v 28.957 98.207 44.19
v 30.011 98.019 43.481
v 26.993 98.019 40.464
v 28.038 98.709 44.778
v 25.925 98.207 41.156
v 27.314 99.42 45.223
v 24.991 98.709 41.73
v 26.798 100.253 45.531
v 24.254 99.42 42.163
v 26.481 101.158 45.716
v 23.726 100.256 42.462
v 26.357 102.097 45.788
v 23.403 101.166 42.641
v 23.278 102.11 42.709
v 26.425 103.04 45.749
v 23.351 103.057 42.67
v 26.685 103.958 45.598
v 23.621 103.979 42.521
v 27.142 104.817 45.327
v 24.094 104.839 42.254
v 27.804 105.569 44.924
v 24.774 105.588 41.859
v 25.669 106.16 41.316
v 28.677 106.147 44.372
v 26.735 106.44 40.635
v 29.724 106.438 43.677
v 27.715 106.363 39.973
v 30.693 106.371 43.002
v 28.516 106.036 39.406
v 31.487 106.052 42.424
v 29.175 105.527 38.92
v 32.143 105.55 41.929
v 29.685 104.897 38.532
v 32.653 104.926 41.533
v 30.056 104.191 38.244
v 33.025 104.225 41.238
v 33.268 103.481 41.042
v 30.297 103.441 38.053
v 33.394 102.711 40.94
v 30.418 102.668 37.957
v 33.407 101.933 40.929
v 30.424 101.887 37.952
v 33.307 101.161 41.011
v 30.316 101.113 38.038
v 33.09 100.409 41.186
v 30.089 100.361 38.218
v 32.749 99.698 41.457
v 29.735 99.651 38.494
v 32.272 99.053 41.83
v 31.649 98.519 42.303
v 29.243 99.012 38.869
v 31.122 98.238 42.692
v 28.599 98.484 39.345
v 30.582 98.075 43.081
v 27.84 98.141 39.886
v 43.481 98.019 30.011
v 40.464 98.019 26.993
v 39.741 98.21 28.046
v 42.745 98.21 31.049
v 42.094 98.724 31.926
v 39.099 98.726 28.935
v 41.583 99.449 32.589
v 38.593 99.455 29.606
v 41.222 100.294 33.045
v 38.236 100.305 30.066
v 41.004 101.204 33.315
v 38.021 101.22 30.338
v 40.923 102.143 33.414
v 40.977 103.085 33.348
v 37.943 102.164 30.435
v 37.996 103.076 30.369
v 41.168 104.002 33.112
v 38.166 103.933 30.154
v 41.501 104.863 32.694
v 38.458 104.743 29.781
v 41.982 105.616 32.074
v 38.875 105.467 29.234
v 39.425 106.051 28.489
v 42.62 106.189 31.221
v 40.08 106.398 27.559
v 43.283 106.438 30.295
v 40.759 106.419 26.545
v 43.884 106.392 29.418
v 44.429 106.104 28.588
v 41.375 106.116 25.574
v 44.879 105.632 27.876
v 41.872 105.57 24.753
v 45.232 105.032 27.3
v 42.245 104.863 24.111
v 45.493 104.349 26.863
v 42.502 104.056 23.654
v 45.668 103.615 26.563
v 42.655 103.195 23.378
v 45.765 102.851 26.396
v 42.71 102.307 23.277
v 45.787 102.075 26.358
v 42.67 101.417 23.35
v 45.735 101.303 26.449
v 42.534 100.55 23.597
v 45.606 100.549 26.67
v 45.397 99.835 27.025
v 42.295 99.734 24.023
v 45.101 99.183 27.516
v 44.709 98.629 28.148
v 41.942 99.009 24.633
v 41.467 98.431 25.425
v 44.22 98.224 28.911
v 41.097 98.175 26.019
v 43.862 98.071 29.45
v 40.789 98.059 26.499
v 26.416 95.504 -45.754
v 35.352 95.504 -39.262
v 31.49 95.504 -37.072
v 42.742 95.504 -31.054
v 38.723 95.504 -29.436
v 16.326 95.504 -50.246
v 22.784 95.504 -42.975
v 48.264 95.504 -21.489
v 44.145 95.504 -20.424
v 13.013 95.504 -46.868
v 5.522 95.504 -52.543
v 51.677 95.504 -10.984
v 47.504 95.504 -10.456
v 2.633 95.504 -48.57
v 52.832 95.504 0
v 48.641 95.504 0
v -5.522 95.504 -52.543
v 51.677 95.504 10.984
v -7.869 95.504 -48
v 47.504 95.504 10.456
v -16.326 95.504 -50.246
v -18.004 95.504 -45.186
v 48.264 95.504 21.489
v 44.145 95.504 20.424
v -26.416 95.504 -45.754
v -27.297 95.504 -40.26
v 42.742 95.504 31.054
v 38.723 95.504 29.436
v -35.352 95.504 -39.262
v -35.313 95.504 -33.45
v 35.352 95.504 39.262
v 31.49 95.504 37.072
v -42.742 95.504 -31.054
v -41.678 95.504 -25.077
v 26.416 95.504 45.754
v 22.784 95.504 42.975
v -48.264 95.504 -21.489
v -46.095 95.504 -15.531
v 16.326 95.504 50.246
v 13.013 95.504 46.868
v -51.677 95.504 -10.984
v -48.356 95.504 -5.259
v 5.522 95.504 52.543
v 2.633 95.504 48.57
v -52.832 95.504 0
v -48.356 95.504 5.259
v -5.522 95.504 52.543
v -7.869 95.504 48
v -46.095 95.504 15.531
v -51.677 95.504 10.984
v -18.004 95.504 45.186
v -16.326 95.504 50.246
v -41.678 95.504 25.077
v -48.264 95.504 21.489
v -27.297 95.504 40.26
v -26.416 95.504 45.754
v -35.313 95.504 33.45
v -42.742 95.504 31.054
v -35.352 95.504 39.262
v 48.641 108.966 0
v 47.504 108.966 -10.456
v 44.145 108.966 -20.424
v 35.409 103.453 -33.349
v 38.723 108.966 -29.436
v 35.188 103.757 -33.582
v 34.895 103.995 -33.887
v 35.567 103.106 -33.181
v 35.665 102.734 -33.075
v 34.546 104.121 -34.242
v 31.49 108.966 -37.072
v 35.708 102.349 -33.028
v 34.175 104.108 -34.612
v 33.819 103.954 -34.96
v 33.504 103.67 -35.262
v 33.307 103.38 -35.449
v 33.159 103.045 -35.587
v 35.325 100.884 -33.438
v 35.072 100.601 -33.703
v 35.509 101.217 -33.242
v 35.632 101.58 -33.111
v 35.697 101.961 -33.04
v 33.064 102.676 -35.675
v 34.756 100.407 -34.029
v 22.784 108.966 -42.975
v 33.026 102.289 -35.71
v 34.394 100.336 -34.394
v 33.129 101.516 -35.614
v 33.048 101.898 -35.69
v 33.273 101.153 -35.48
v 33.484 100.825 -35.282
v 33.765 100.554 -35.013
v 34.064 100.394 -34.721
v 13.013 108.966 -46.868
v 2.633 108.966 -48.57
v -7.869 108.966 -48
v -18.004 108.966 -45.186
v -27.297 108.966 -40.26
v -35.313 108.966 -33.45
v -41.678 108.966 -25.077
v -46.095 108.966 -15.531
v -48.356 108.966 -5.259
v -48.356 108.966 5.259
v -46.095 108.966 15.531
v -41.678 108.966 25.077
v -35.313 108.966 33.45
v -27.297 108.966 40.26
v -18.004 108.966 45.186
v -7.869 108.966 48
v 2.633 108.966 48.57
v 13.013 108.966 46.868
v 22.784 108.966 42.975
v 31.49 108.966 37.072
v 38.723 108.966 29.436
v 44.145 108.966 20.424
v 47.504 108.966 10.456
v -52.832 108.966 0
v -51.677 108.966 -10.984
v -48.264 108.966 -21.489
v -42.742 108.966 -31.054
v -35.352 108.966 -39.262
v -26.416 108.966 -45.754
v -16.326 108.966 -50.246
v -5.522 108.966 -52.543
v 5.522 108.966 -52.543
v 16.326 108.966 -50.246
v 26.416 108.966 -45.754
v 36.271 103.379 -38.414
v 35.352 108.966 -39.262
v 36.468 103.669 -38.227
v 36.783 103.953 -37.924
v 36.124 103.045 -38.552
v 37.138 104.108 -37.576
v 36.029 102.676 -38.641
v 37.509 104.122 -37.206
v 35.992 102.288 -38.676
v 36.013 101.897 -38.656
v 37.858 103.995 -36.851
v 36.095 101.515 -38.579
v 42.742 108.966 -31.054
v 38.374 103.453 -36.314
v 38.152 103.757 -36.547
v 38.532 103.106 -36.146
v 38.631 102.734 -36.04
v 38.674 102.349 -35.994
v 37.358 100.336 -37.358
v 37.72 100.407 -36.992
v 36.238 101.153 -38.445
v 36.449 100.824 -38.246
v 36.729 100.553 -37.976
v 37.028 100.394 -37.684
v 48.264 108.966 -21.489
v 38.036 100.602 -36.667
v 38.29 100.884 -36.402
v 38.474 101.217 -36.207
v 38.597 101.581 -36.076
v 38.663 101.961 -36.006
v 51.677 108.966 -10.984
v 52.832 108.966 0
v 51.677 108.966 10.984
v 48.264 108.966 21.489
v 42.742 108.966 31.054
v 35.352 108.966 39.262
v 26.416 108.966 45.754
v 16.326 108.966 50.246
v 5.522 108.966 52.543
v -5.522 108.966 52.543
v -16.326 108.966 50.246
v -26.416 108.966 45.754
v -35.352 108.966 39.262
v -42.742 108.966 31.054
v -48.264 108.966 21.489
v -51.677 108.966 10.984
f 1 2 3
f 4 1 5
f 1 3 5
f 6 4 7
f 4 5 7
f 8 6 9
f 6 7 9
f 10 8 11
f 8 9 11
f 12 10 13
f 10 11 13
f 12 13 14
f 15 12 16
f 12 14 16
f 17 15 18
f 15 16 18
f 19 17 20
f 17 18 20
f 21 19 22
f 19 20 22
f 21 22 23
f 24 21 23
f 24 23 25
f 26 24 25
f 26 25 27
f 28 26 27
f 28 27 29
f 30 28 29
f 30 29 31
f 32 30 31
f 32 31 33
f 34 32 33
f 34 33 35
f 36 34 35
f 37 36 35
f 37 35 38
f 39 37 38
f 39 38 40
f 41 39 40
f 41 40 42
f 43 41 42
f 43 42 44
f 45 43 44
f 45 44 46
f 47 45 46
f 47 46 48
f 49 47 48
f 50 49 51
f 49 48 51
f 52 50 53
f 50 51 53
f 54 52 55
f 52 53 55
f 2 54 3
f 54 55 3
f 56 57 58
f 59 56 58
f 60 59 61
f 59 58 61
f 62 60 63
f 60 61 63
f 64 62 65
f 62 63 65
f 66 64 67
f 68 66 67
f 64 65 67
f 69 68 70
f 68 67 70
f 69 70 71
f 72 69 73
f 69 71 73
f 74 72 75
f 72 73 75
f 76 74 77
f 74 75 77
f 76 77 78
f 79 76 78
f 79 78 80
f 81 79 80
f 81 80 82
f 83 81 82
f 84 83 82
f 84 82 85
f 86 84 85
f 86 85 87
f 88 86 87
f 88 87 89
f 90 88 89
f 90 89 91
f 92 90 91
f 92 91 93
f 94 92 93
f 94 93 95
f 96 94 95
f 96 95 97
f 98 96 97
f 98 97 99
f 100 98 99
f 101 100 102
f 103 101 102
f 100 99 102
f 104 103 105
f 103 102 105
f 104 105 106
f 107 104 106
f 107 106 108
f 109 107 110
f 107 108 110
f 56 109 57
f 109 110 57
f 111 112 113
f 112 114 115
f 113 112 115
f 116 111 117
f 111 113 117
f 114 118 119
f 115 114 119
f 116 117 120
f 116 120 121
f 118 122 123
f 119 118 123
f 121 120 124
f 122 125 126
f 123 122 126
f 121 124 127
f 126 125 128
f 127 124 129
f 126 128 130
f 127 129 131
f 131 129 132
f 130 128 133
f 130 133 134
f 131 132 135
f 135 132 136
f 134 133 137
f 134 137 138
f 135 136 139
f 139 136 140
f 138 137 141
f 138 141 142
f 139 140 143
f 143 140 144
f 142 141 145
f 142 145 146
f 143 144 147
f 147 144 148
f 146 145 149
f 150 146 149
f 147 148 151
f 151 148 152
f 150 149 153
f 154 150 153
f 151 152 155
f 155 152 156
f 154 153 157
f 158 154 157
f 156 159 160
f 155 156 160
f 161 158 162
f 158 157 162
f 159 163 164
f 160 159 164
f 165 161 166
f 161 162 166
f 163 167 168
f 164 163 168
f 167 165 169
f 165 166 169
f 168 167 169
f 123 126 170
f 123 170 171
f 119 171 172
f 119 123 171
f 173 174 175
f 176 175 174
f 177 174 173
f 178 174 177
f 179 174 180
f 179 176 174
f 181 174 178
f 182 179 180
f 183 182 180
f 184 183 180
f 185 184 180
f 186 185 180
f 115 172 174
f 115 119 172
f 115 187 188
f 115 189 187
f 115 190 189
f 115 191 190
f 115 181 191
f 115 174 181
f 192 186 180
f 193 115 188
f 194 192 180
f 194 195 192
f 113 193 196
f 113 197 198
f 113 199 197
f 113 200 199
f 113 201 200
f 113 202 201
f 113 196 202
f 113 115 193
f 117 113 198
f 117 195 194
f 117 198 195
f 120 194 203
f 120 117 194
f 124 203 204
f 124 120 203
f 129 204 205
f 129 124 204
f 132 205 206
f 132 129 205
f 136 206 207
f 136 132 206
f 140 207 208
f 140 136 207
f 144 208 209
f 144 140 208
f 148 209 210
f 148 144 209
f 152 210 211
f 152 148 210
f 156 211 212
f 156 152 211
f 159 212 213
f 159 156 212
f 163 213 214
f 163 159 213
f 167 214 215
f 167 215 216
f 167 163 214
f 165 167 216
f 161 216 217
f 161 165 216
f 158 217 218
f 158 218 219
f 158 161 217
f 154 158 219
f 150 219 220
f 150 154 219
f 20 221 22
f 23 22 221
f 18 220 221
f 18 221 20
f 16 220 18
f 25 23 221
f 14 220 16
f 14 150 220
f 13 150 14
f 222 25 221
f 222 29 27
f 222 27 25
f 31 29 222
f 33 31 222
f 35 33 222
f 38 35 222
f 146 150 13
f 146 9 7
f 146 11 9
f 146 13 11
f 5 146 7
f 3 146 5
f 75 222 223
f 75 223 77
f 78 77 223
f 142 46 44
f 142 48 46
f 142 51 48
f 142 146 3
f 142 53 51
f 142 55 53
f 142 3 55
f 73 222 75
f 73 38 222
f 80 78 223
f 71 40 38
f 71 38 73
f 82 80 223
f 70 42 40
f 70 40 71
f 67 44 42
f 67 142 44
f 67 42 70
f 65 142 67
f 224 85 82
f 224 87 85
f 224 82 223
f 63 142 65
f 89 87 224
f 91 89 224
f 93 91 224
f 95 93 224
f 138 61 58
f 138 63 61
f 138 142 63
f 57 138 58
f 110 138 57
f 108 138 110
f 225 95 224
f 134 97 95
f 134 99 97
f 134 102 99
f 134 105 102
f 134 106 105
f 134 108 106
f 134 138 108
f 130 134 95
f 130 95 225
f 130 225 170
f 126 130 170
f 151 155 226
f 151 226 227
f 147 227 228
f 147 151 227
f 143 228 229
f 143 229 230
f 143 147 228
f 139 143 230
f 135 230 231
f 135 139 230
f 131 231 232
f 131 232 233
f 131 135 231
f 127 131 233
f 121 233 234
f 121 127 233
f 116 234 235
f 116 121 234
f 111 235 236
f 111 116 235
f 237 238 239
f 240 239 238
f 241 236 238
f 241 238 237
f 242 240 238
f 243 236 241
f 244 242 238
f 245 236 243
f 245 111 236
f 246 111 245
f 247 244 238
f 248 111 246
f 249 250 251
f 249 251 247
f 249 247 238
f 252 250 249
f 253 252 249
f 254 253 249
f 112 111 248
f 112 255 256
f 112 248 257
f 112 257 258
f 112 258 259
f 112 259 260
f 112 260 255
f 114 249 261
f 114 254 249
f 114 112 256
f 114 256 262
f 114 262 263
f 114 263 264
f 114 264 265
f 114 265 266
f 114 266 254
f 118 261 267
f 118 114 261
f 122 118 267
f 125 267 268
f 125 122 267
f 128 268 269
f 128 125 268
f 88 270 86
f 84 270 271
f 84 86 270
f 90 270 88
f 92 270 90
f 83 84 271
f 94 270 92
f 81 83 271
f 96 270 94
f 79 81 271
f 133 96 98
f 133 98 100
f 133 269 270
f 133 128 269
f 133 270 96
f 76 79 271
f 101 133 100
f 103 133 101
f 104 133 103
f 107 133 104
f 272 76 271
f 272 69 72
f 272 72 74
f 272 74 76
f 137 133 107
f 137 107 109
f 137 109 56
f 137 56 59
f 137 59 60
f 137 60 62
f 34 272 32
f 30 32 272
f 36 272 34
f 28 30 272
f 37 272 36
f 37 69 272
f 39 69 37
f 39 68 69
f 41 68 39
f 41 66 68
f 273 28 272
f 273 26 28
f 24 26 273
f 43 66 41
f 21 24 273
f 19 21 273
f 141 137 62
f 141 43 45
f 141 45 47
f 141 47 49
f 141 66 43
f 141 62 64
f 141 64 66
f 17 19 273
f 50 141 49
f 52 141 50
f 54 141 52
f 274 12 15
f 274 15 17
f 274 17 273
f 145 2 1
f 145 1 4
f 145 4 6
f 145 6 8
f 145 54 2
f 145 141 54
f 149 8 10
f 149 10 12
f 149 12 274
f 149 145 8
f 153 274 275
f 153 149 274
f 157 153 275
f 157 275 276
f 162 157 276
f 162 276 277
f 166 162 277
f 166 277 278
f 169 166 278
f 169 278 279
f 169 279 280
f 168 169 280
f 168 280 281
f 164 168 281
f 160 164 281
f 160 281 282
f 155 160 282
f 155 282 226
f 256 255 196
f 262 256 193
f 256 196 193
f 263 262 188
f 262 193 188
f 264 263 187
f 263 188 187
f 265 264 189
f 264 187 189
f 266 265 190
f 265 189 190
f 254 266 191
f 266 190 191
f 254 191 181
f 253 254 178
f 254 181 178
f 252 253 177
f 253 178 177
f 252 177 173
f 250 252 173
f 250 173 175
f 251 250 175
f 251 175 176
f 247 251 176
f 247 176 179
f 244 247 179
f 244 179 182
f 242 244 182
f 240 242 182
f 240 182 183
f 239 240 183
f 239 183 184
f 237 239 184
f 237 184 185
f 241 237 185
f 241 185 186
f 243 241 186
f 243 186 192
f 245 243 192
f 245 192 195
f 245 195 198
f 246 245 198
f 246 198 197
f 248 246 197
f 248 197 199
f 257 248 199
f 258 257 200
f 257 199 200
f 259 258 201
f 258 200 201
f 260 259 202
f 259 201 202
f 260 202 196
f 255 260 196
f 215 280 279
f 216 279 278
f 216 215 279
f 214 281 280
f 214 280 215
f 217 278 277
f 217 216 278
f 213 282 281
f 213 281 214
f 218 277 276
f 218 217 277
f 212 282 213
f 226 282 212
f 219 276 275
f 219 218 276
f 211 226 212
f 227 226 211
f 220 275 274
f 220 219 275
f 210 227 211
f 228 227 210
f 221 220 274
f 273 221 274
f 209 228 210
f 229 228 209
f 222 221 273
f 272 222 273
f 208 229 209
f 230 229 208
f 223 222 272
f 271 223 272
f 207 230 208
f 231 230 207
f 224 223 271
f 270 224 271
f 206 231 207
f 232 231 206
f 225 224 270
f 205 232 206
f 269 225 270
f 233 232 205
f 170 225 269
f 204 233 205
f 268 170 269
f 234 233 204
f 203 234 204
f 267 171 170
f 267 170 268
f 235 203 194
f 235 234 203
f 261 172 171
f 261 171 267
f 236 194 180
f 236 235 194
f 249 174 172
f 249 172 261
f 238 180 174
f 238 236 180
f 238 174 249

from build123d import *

# Parameters (mm, degrees)
SKETCH2_R                    = 7.9375
SKETCH2_R_2                  = 3.7465
BOSS_EXTRUDE1_DEPTH          = 204.47
FILLET1_R                    = 3.81
CIRPATTERN1_COUNT            = 4
FILLET1_OF_CIRPATTERN1_R     = 3.81
SKETCH3_R                    = 8.636
CUT_EXTRUDE1_DEPTH           = 12.7
CIRPATTERN2_COUNT            = 4
FILLET2_R                    = 2.54
MIRROR1_COPY_1_SKETCH_R      = 8.636
MIRROR1_COPY_1_DEPTH         = 12.7
MIRROR1_COPY_2_SKETCH_R      = 8.636
MIRROR1_COPY_2_DEPTH         = 12.7
MIRROR1_COPY_3_SKETCH_R      = 8.636
MIRROR1_COPY_3_DEPTH         = 12.7
FILLET3_R                    = 2.54
F_5_16_CLEARANCE_HOLE1_D     = 8.4328
F_5_16_CLEARANCE_HOLE1_DEPTH = 54.864
F_5_16_CLEARANCE_HOLE1_TIP   = 2.533468714
F_6_CLEARANCE_HOLE1_D        = 3.7973
F_6_CLEARANCE_HOLE1_DEPTH    = 54.864
F_6_CLEARANCE_HOLE1_TIP      = 1.140824014
CUT_EXTRUDE2_START           = -204.47
SKETCH9_R                    = 52.832
CUT_EXTRUDE2_DEPTH           = 95.504


with BuildPart() as part:
    # Sketch1 → Revolve1 (revolve)
    with BuildSketch(Plane.XY, mode=Mode.PRIVATE) as revolve1_sk:
        Polygon((44.45, 0), (44.45, 204.47), (50.6984, 204.47), (50.6984, 108.966), (52.832, 108.966), (52.832, 95.504), (50.6984, 95.504), (50.6984, 0), align=None)
    revolve(revolve1_sk.sketch.rotate(Axis((0, 138.931800571, 0), (0, -1, 0)), 180), axis=Axis((0, 138.931800571, 0), (0, -1, 0)))

    # Sketch2 → Boss-Extrude1 (add)
    with BuildSketch(Plane(origin=(0, 204.47, 0), x_dir=(1, 0, 0), z_dir=(0, 1, 0))):
        with Locations((0, 40.7035)):
            Circle(SKETCH2_R)
        with Locations(Location((0, 40.7035, 0), (0, 0, 180))):
            Circle(SKETCH2_R_2, mode=Mode.SUBTRACT)
    boss_extrude1 = extrude(amount=-BOSS_EXTRUDE1_DEPTH)

    # Fillet1
    fillet1_edges = [part.edges().sort_by_distance(p)[0] for p in [
        (-7.287865551, 102.235, -43.848483619),
        (7.287865551, 102.235, -43.848483619),
    ]]
    fillet(fillet1_edges, radius=FILLET1_R)

    # CirPattern1: Boss-Extrude1 ×4 about axis
    cirpattern1_axis = Axis((0, 0, 0), (0, 1, 0))
    for i in range(1, CIRPATTERN1_COUNT):
        add(boss_extrude1.rotate(cirpattern1_axis, i * 360 / CIRPATTERN1_COUNT))

    # Fillet1 of CirPattern1
    fillet1_of_cirpattern1_edges = [part.edges().sort_by_distance(p)[0] for p in [
        (-43.848483619, 102.235, 7.287865551),
        (-43.848483619, 102.235, -7.287865551),
        (7.287865551, 102.235, 43.848483619),
        (-7.287865551, 102.235, 43.848483619),
        (43.848483619, 102.235, -7.287865551),
        (43.848483619, 102.235, 7.287865551),
    ]]
    fillet(fillet1_of_cirpattern1_edges, radius=FILLET1_OF_CIRPATTERN1_R)

    # Sketch3 → Cut-Extrude1 (cut)
    with BuildSketch(Plane(origin=(0, 204.47, 0), x_dir=(1, 0, 0), z_dir=(0, 1, 0))):
        with Locations((0, 40.7035)):
            Circle(SKETCH3_R)
    cut_extrude1 = extrude(amount=-CUT_EXTRUDE1_DEPTH, mode=Mode.SUBTRACT)

    # CirPattern2: Cut-Extrude1 ×4 about axis
    cirpattern2_axis = Axis((0, 0, 0), (0, 1, 0))
    for i in range(1, CIRPATTERN2_COUNT):
        add(cut_extrude1.rotate(cirpattern2_axis, i * 360 / CIRPATTERN2_COUNT), mode=Mode.SUBTRACT)

    # Fillet2
    fillet2_edges = [part.edges().sort_by_distance(p)[0] for p in [
        (-8.61576795, 198.12, -41.294294914),
        (8.61576795, 198.12, -41.294294914),
        (-41.294294914, 198.12, 8.61576795),
        (8.61576795, 198.12, 41.294294914),
        (41.294294914, 198.12, -8.61576795),
        (41.294294914, 198.12, 8.61576795),
        (-8.61576795, 198.12, 41.294294914),
        (-41.294294914, 198.12, -8.61576795),
    ]]
    fillet(fillet2_edges, radius=FILLET2_R)

    # Mirror1: Cut-Extrude1 across plane
    add(cut_extrude1.mirror(Plane.ZX.offset(102.235)), mode=Mode.SUBTRACT)

    # Mirror1 copy 1 sketch → Mirror1 copy 1 (cut)
    with BuildSketch(Plane(origin=(0, 0, 0), x_dir=(0, 0, -1), z_dir=(0, -1, 0))):
        with Locations((0, -40.7035)):
            Circle(MIRROR1_COPY_1_SKETCH_R)
    extrude(amount=-MIRROR1_COPY_1_DEPTH, mode=Mode.SUBTRACT)

    # Mirror1 copy 2 sketch → Mirror1 copy 2 (cut)
    with BuildSketch(Plane(origin=(0, 0, 0), x_dir=(-1, 0, 0), z_dir=(0, -1, 0))):
        with Locations((0, -40.7035)):
            Circle(MIRROR1_COPY_2_SKETCH_R)
    extrude(amount=-MIRROR1_COPY_2_DEPTH, mode=Mode.SUBTRACT)

    # Mirror1 copy 3 sketch → Mirror1 copy 3 (cut)
    with BuildSketch(Plane(origin=(0, 0, 0), x_dir=(0, 0, 1), z_dir=(0, -1, 0))):
        with Locations((0, -40.7035)):
            Circle(MIRROR1_COPY_3_SKETCH_R)
    extrude(amount=-MIRROR1_COPY_3_DEPTH, mode=Mode.SUBTRACT)

    # Fillet3
    fillet3_edges = [part.edges().sort_by_distance(p)[0] for p in [
        (-41.294294914, 6.35, 8.61576795),
        (8.61576795, 6.35, 41.294294914),
        (41.294294914, 6.35, -8.61576795),
        (-8.61576795, 6.35, -41.294294914),
        (8.61576795, 6.35, -41.294294914),
        (41.294294914, 6.35, 8.61576795),
        (-8.61576795, 6.35, 41.294294914),
        (-41.294294914, 6.35, -8.61576795),
    ]]
    fillet(fillet3_edges, radius=FILLET3_R)

    # 5/16 Clearance Hole1
    with Locations(Plane(origin=(37.357865464, 0, 37.357865464), x_dir=(0, 1, 0), z_dir=(0.7071067811865488, 0, 0.7071067811865464))):
        with Locations((102.235, -9.525), (102.235, 9.525)):
            Hole(F_5_16_CLEARANCE_HOLE1_D / 2, depth=F_5_16_CLEARANCE_HOLE1_DEPTH)
            with Locations((0, 0, -(F_5_16_CLEARANCE_HOLE1_DEPTH + F_5_16_CLEARANCE_HOLE1_TIP / 2))):  # 118° drill point
                Cone(0, F_5_16_CLEARANCE_HOLE1_D / 2, F_5_16_CLEARANCE_HOLE1_TIP, mode=Mode.SUBTRACT)

    # #6 Clearance Hole1
    with Locations(Plane(origin=(37.357865464, 0, -37.357865464), x_dir=(0, 1, 0), z_dir=(0.7071067811865438, 0, -0.7071067811865512))):
        with Locations((102.235, 0)):
            Hole(F_6_CLEARANCE_HOLE1_D / 2, depth=F_6_CLEARANCE_HOLE1_DEPTH)
            with Locations((0, 0, -(F_6_CLEARANCE_HOLE1_DEPTH + F_6_CLEARANCE_HOLE1_TIP / 2))):  # 118° drill point
                Cone(0, F_6_CLEARANCE_HOLE1_D / 2, F_6_CLEARANCE_HOLE1_TIP, mode=Mode.SUBTRACT)

    # Sketch9 → Cut-Extrude2 (cut)
    with BuildSketch(Plane(origin=(0, 204.47, 0), x_dir=(1, 0, 0), z_dir=(0, 1, 0)).offset(CUT_EXTRUDE2_START)):
        with Locations(Location((0, 0, 0), (0, 0, 180))):
            Circle(SKETCH9_R)
    extrude(amount=CUT_EXTRUDE2_DEPTH, mode=Mode.SUBTRACT)

    # Sketch11 → Cut-Revolve2 (revolve, cut)
    with BuildSketch(Plane.XY):
        Polygon((48.641, 95.504), (0, 95.504), (0, 204.47), (50.6984, 204.47), (50.6984, 108.966), (48.641, 108.966), align=None)
    revolve(axis=Axis((0, 95.504, 0), (0, 1, 0)), mode=Mode.SUBTRACT)


solid = part.part
